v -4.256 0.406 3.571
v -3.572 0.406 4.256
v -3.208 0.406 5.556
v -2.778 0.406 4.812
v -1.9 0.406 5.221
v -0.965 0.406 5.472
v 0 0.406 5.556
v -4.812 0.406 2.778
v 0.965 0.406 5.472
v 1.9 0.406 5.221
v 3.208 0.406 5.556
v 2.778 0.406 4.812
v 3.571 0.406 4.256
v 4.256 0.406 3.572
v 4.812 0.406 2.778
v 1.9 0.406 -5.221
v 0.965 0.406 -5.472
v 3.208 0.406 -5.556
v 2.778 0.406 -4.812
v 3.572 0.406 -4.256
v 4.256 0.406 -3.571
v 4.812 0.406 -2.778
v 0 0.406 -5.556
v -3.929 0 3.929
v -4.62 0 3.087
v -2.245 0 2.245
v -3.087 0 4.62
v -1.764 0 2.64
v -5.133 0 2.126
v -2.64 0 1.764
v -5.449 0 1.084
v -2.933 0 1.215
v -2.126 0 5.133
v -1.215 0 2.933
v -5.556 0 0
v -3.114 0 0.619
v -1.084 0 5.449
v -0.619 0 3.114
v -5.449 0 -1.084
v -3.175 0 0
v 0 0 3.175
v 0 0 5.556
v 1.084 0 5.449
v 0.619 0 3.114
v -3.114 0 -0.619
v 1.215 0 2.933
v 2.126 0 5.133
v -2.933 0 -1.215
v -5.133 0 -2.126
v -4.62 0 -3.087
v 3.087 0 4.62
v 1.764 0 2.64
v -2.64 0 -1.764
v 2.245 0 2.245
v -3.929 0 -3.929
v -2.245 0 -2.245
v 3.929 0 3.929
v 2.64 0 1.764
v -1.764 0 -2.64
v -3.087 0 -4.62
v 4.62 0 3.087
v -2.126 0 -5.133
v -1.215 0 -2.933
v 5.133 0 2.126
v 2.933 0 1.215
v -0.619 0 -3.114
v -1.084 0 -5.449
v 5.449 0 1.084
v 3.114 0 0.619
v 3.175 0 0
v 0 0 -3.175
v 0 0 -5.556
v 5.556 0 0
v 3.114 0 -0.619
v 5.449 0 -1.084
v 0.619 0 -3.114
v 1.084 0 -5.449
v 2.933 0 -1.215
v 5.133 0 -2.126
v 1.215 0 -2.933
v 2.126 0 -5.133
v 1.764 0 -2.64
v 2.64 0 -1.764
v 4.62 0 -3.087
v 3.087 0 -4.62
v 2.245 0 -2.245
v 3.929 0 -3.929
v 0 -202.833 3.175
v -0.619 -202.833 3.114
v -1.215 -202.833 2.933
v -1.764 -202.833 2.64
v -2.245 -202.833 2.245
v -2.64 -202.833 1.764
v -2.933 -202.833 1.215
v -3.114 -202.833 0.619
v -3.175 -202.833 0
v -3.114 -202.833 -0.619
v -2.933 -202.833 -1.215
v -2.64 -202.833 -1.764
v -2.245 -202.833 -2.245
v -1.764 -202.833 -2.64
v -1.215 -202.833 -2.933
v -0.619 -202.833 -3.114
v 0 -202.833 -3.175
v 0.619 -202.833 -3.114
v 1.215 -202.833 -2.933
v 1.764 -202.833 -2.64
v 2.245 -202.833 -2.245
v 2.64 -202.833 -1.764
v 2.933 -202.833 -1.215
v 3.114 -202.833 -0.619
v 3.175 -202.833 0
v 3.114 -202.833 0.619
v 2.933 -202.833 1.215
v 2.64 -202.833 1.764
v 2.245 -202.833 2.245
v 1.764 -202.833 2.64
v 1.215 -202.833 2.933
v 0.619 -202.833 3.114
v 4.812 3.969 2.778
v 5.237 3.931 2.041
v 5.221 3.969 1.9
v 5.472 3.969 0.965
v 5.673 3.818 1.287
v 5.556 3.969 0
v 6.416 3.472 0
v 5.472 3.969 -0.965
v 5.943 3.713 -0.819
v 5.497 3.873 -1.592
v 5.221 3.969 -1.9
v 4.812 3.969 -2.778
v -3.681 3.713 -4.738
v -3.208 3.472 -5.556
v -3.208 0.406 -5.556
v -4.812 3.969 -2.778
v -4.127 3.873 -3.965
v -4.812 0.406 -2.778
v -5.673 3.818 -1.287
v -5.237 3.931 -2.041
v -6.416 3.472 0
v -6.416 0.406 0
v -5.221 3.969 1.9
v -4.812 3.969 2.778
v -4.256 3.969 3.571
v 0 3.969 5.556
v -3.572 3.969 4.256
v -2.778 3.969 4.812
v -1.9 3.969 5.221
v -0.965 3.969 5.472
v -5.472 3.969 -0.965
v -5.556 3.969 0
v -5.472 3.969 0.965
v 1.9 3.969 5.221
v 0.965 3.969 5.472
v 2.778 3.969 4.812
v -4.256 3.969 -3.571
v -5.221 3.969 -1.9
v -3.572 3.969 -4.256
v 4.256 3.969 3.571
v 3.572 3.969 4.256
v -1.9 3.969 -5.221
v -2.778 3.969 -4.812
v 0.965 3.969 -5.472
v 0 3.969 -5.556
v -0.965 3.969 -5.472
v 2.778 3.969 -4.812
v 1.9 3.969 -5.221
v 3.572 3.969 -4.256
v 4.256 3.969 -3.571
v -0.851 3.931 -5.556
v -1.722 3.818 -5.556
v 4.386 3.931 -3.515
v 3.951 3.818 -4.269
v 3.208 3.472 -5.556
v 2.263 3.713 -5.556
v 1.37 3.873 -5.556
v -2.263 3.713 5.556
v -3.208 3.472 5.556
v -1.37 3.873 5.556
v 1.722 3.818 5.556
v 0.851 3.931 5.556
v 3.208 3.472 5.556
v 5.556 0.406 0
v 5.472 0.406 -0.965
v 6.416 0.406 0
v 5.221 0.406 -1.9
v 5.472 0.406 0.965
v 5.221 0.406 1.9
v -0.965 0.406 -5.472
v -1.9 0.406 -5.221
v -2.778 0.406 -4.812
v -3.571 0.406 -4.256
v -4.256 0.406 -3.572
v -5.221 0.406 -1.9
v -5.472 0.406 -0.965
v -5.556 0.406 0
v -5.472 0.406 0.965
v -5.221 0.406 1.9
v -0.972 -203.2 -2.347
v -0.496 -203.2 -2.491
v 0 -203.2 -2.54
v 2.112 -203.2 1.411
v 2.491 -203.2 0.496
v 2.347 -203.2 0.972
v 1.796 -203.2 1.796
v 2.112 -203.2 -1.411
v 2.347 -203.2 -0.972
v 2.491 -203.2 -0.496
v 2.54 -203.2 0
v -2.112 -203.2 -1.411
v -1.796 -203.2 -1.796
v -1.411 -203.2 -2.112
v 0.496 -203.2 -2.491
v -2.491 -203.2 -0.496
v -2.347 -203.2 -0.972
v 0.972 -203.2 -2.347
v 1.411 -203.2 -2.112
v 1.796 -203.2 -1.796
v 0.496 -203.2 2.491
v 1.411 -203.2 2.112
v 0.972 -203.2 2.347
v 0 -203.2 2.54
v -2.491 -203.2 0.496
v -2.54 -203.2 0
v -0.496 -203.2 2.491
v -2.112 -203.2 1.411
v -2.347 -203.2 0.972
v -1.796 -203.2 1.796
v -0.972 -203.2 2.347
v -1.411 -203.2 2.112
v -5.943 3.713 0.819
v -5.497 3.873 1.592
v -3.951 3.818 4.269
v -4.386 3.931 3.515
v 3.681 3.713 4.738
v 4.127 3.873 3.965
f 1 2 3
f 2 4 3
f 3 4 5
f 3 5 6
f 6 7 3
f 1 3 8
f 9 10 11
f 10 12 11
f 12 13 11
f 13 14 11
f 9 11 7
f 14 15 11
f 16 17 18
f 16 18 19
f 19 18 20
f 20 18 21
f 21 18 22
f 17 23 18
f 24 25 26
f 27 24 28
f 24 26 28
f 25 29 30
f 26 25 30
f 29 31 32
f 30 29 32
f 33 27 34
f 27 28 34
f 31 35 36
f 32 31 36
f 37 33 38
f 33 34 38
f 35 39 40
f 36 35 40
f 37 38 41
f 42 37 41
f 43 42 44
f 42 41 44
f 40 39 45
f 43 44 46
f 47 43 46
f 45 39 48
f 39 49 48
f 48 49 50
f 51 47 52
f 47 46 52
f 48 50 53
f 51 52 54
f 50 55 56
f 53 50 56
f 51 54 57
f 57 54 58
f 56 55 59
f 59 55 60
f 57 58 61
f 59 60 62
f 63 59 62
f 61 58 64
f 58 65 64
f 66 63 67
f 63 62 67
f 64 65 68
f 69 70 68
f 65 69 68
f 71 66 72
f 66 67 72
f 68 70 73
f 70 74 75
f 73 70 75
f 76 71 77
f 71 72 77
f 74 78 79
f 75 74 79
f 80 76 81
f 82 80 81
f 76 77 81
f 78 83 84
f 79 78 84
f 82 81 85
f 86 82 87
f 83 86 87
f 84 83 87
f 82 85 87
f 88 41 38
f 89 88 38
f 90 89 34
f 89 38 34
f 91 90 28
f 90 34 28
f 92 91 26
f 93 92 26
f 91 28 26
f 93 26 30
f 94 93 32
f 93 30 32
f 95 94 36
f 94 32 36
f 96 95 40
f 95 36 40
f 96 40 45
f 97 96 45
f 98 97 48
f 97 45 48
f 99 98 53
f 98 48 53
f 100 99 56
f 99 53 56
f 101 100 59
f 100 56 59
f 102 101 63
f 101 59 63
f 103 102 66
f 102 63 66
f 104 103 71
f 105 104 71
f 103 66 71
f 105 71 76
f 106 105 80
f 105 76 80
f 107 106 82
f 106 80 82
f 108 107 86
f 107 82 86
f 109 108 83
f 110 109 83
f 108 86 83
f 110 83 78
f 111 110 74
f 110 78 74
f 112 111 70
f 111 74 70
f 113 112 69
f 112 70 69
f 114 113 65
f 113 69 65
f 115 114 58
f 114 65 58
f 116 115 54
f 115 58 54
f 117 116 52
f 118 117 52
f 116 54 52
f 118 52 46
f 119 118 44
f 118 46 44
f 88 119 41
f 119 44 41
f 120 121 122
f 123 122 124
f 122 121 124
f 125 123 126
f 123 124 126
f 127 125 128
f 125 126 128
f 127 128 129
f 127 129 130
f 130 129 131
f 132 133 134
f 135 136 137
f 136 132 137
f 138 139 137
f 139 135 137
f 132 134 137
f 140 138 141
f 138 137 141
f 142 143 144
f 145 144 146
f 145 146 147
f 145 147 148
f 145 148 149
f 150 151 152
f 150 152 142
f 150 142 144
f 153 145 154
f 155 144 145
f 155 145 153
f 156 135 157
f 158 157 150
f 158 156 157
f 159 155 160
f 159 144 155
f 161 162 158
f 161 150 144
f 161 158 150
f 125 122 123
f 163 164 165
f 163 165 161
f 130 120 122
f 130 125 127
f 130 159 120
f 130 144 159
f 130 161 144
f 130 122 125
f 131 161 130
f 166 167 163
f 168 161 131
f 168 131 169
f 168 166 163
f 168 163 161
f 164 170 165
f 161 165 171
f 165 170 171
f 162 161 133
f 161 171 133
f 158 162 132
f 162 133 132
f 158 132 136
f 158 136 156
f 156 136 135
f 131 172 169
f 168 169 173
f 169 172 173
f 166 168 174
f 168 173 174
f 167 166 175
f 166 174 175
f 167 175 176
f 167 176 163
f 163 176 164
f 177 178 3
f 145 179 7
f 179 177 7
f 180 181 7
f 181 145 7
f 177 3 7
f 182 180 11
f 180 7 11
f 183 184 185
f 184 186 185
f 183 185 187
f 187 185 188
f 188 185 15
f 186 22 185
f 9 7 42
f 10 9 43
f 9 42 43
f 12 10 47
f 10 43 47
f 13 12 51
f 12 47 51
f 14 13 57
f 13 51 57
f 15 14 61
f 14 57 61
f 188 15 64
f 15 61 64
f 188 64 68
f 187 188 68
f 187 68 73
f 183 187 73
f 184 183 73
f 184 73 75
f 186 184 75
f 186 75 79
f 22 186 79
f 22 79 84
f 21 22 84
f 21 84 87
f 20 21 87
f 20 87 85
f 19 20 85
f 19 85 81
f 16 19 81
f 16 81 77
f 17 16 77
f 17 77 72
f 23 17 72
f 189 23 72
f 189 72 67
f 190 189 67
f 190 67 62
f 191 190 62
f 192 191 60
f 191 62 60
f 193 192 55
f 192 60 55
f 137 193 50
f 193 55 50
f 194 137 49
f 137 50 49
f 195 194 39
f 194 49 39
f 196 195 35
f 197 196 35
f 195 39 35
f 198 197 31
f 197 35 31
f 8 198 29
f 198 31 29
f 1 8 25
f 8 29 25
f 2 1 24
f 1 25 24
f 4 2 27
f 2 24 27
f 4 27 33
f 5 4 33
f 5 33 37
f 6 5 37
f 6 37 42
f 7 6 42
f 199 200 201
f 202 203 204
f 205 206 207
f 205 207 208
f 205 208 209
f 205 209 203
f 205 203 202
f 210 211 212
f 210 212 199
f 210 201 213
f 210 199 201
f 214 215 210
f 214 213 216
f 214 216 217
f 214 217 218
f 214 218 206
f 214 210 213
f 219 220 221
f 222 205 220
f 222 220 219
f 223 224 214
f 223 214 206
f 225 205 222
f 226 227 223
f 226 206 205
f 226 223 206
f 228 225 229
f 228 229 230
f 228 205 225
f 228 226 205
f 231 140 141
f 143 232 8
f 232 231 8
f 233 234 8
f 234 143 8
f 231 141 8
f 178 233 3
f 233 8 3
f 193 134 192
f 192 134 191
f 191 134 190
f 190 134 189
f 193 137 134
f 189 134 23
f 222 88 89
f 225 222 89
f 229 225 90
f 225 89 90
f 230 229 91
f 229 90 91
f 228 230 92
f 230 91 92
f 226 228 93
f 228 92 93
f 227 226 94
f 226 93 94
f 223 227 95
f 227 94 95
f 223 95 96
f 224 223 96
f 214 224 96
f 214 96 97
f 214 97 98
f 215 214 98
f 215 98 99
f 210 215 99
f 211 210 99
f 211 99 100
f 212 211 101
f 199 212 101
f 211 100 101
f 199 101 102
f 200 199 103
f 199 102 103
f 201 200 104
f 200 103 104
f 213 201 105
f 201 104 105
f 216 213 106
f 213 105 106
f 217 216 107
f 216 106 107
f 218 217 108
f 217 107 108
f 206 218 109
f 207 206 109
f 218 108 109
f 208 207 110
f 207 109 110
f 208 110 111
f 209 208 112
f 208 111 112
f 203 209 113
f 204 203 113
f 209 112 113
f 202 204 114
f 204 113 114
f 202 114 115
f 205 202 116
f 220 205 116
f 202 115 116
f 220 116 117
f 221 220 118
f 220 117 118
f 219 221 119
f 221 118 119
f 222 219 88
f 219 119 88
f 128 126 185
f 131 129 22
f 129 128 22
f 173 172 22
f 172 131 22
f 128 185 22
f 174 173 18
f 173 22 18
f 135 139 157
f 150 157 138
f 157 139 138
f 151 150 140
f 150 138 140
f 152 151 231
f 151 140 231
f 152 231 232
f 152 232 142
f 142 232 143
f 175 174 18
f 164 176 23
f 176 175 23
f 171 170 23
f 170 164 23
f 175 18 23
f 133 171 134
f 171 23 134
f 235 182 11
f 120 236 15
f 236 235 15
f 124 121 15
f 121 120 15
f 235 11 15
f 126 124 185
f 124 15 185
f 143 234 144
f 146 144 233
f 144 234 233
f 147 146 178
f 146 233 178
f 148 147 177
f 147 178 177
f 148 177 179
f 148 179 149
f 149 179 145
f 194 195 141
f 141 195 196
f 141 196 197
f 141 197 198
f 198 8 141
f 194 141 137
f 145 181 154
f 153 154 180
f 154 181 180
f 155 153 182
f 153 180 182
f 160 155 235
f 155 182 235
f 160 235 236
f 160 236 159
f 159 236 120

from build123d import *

# Parameters (mm, degrees)
BASE_EXTRUDE_DEPTH  = 3.96875
SKETCH5_R           = 3.175
BOSS_EXTRUDE1_DEPTH = 203.2
CHAMFER1_SIZE       = 0.635
CHAMFER1_SIZE2      = 0.366617421


with BuildPart() as part:
    # Sketch4 → Base-Extrude (new body)
    with BuildSketch(Plane(origin=(0, 0, 0), x_dir=(1, 0, 0), z_dir=(0, 1, 0))):
        Polygon((6.415804866, 0), (3.207902433, 5.55625), (-3.207902433, 5.55625), (-6.415804866, 0), (-3.207902433, -5.55625), (3.207902433, -5.55625), align=None)
    extrude(amount=BASE_EXTRUDE_DEPTH)

    # Sketch5 → Boss-Extrude1 (add)
    with BuildSketch(Plane.XZ):
        with Locations(Location((0, 0, 0), (0, 0, 90))):
            Circle(SKETCH5_R)
    extrude(amount=BOSS_EXTRUDE1_DEPTH)

    # Sketch8 → Cut-Revolve1 (revolve, cut)
    with BuildSketch(Plane(origin=(0, 0, 0), x_dir=(0, 0, -1), z_dir=(1, 0, 0)), mode=Mode.PRIVATE) as cut_revolve1_sk:
        Polygon((5.55625, 3.96875), (11.726421194, 0.4064), (5.55625, 0.4064), (5.55625, 0), (14.266421194, 0), (14.266421194, 3.96875), align=None)
    revolve(cut_revolve1_sk.sketch.rotate(Axis((0, 0, 0), (0, 1, 0)), 180), axis=Axis((0, 0, 0), (0, 1, 0)), mode=Mode.SUBTRACT)

    # Chamfer1
    chamfer1_edges = [part.edges().sort_by_distance(p)[0] for p in [
        (0, -203.2, -3.175),
    ]]
    chamfer1_side = [part.faces().sort_by_distance(p)[0] for p in [
        (0, -203.2, 0),
    ]]
    chamfer(chamfer1_edges, length=CHAMFER1_SIZE, length2=CHAMFER1_SIZE2, reference=chamfer1_side[0])


solid = part.part
